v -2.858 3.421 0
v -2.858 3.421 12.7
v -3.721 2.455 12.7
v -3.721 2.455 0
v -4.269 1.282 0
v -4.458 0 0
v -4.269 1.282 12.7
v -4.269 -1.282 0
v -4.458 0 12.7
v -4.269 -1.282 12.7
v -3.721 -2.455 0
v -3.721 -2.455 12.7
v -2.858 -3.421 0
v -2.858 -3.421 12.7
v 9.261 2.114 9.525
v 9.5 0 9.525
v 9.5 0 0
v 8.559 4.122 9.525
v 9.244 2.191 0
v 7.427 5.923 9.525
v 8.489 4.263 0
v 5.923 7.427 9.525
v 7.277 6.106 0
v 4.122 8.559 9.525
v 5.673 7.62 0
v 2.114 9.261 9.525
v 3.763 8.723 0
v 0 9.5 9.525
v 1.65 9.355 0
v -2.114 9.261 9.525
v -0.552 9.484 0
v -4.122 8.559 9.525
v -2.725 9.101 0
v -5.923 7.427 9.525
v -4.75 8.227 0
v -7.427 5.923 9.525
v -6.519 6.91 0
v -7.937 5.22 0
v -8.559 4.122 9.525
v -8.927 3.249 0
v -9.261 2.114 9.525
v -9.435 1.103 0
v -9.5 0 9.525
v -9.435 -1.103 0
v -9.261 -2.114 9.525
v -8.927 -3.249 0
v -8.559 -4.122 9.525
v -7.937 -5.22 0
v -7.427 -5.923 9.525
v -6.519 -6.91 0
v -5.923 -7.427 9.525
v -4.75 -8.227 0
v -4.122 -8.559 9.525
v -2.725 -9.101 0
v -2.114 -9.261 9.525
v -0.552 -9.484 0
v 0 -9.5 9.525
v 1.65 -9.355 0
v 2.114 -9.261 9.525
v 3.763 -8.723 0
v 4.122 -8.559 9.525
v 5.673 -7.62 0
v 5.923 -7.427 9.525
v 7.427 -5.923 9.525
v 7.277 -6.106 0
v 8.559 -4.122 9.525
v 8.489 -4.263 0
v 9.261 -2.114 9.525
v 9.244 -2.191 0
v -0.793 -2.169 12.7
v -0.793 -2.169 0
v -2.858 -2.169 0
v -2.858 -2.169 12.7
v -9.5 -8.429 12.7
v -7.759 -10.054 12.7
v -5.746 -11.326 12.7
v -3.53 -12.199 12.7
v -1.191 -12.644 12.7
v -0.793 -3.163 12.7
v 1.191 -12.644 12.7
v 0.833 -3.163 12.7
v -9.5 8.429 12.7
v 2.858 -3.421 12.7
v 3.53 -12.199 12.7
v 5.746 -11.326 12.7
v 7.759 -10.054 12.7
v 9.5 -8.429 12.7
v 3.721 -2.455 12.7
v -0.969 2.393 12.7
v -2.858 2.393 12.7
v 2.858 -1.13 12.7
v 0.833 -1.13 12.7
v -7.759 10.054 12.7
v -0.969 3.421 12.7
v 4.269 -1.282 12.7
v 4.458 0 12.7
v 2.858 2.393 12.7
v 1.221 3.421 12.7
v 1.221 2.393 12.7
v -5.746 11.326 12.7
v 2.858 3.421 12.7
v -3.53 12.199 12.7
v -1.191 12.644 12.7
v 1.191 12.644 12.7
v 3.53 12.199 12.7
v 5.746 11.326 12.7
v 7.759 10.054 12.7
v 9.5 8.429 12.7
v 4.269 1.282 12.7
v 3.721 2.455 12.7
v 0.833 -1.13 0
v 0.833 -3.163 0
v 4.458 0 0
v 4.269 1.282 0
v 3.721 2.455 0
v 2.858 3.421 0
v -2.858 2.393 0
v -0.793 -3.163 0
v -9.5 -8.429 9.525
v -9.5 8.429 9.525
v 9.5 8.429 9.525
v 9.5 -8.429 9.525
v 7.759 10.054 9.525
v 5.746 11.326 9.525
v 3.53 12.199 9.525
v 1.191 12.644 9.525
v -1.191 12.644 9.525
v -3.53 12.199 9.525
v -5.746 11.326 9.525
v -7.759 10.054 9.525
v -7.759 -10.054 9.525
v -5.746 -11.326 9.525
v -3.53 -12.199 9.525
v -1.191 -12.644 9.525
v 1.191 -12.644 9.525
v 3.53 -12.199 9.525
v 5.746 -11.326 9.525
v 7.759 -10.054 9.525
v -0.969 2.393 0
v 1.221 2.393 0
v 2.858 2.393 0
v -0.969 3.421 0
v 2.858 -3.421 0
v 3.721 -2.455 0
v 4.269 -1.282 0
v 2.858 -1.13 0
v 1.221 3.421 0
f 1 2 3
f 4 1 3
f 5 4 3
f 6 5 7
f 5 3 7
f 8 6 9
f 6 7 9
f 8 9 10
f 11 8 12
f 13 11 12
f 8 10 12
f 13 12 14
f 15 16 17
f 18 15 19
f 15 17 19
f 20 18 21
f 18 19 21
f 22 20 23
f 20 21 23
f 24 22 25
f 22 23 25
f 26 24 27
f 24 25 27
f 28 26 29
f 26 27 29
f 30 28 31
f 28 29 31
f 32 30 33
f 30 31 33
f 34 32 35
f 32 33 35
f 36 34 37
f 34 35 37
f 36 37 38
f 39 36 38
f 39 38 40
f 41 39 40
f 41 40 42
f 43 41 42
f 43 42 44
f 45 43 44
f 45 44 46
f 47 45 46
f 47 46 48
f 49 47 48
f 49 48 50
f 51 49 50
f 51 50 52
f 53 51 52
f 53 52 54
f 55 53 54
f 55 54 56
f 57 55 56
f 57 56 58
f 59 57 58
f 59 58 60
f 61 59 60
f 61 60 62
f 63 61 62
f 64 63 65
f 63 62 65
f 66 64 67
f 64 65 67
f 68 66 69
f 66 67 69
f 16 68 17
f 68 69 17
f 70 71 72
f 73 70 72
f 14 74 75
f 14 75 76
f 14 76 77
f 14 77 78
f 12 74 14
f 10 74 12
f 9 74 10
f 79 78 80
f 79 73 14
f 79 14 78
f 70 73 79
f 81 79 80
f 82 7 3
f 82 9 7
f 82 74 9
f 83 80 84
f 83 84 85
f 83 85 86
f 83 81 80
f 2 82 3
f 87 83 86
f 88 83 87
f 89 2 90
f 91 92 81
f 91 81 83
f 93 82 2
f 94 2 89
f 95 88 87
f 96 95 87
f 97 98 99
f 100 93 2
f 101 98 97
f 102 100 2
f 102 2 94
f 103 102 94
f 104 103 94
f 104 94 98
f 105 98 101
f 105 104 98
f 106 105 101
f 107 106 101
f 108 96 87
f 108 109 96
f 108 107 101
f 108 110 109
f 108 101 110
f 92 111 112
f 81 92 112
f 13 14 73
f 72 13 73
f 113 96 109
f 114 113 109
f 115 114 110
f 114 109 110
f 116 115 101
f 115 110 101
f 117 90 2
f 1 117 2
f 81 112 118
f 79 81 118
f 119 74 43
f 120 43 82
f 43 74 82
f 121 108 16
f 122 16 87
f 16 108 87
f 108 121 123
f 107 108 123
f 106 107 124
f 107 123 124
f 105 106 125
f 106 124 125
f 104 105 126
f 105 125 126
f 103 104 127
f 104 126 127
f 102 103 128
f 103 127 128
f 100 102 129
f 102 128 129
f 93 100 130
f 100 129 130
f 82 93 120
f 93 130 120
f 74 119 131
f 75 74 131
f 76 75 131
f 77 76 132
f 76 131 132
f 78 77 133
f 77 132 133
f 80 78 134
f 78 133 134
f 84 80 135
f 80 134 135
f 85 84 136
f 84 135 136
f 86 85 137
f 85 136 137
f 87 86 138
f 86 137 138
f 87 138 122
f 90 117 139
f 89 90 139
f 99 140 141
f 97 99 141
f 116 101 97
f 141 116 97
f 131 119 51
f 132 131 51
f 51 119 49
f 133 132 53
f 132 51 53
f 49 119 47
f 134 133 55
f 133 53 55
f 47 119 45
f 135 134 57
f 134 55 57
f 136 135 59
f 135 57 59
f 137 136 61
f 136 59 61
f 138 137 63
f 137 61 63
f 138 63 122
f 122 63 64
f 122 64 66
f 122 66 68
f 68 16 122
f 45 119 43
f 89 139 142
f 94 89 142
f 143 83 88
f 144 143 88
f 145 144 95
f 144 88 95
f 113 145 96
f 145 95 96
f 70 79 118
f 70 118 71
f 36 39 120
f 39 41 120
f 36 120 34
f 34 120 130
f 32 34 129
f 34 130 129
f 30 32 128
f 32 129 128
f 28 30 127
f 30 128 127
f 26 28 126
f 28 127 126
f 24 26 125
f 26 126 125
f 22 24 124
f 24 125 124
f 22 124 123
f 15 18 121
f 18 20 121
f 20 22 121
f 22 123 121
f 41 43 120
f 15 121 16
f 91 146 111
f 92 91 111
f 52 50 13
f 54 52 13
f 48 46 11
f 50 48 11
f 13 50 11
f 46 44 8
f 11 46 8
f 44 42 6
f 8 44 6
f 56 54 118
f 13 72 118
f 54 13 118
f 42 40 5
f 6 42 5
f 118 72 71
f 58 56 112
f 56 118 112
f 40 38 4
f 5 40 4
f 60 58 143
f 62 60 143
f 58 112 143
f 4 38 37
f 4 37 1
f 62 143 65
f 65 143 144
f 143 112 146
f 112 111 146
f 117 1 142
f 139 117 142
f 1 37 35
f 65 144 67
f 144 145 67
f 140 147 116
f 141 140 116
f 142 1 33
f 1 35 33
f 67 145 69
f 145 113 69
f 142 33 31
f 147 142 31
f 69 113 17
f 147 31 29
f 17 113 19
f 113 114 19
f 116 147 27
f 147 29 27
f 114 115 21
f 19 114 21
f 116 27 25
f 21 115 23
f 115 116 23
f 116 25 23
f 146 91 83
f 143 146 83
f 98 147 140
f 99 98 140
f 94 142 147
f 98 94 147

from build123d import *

# Parameters (mm, degrees)
F0_R     = 9.4996
F1_DEPTH = 9.525
F2_R     = 12.7
F2_R_2   = 9.4996
F3_DEPTH = 3.175
F5_DEPTH = 25.4
F7_DEPTH = 25.4
F9_DEPTH = 25.4


with BuildPart() as f1:
    # F0 (on Top) → F1 (new body)
    with BuildSketch(Plane.XY):
        Circle(F0_R)
    extrude(amount=F1_DEPTH)

    # F2 (on face) → F3 (join)
    with BuildSketch(Plane.XY.offset(9.525)):
        Circle(F2_R)
        Circle(F2_R_2, mode=Mode.SUBTRACT)
        Circle(F2_R_2)
    extrude(amount=F3_DEPTH)

    # F4 (on face) → F5 (cut)
    with BuildSketch(Plane.XY.offset(12.7)):
        with BuildLine():
            ThreePointArc((-9.4996, 8.428974), (-12.7, 0), (-9.4996, -8.428974))
            Line((-9.4996, -8.428974), (-9.4996, 8.428974))
        make_face()
        with BuildLine():
            Line((9.4996, 8.428974), (9.4996, -8.428974))
            ThreePointArc((9.4996, -8.428974), (11.872972, -4.508053), (12.7, 0))
            ThreePointArc((12.7, 0), (11.872972, 4.508053), (9.4996, 8.428974))
        make_face()
    extrude(amount=-F5_DEPTH, mode=Mode.SUBTRACT)

    # F6 (on face) → F7 (cut)
    with BuildSketch(Plane.XY.offset(12.7)):
        with BuildLine():
            ThreePointArc((2.8575, -3.421372), (4.037881, -1.888546), (4.4577, 0))
            ThreePointArc((4.4577, 0), (4.037881, 1.888546), (2.8575, 3.421372))
            Line((2.8575, 3.421372), (2.8575, -3.421372))
        make_face()
        with BuildLine():
            Line((-2.8575, -3.421372), (-2.8575, 3.421372))
            ThreePointArc((-2.8575, 3.421372), (-4.4577, 0), (-2.8575, -3.421372))
        make_face()
    extrude(amount=-F7_DEPTH, mode=Mode.SUBTRACT)

    # F8 (on face) → F9 (cut)
    with BuildSketch(Plane(origin=(0, 0, 0), x_dir=(1, 0, 0), z_dir=(0, 0, -1))):
        Polygon((-2.8575, 2.16922), (-2.8575, -2.392801), (-0.969418, -2.392801), (-0.969418, -3.421372), (1.220574, -3.421372), (1.220574, -2.392801), (2.8575, -2.392801), (2.8575, 1.130344), (0.832597, 1.130344), (0.832597, 3.162927), (-0.79347, 3.162927), (-0.79347, 2.16922), align=None)
    extrude(amount=-F9_DEPTH, mode=Mode.SUBTRACT)


solid = f1.part
